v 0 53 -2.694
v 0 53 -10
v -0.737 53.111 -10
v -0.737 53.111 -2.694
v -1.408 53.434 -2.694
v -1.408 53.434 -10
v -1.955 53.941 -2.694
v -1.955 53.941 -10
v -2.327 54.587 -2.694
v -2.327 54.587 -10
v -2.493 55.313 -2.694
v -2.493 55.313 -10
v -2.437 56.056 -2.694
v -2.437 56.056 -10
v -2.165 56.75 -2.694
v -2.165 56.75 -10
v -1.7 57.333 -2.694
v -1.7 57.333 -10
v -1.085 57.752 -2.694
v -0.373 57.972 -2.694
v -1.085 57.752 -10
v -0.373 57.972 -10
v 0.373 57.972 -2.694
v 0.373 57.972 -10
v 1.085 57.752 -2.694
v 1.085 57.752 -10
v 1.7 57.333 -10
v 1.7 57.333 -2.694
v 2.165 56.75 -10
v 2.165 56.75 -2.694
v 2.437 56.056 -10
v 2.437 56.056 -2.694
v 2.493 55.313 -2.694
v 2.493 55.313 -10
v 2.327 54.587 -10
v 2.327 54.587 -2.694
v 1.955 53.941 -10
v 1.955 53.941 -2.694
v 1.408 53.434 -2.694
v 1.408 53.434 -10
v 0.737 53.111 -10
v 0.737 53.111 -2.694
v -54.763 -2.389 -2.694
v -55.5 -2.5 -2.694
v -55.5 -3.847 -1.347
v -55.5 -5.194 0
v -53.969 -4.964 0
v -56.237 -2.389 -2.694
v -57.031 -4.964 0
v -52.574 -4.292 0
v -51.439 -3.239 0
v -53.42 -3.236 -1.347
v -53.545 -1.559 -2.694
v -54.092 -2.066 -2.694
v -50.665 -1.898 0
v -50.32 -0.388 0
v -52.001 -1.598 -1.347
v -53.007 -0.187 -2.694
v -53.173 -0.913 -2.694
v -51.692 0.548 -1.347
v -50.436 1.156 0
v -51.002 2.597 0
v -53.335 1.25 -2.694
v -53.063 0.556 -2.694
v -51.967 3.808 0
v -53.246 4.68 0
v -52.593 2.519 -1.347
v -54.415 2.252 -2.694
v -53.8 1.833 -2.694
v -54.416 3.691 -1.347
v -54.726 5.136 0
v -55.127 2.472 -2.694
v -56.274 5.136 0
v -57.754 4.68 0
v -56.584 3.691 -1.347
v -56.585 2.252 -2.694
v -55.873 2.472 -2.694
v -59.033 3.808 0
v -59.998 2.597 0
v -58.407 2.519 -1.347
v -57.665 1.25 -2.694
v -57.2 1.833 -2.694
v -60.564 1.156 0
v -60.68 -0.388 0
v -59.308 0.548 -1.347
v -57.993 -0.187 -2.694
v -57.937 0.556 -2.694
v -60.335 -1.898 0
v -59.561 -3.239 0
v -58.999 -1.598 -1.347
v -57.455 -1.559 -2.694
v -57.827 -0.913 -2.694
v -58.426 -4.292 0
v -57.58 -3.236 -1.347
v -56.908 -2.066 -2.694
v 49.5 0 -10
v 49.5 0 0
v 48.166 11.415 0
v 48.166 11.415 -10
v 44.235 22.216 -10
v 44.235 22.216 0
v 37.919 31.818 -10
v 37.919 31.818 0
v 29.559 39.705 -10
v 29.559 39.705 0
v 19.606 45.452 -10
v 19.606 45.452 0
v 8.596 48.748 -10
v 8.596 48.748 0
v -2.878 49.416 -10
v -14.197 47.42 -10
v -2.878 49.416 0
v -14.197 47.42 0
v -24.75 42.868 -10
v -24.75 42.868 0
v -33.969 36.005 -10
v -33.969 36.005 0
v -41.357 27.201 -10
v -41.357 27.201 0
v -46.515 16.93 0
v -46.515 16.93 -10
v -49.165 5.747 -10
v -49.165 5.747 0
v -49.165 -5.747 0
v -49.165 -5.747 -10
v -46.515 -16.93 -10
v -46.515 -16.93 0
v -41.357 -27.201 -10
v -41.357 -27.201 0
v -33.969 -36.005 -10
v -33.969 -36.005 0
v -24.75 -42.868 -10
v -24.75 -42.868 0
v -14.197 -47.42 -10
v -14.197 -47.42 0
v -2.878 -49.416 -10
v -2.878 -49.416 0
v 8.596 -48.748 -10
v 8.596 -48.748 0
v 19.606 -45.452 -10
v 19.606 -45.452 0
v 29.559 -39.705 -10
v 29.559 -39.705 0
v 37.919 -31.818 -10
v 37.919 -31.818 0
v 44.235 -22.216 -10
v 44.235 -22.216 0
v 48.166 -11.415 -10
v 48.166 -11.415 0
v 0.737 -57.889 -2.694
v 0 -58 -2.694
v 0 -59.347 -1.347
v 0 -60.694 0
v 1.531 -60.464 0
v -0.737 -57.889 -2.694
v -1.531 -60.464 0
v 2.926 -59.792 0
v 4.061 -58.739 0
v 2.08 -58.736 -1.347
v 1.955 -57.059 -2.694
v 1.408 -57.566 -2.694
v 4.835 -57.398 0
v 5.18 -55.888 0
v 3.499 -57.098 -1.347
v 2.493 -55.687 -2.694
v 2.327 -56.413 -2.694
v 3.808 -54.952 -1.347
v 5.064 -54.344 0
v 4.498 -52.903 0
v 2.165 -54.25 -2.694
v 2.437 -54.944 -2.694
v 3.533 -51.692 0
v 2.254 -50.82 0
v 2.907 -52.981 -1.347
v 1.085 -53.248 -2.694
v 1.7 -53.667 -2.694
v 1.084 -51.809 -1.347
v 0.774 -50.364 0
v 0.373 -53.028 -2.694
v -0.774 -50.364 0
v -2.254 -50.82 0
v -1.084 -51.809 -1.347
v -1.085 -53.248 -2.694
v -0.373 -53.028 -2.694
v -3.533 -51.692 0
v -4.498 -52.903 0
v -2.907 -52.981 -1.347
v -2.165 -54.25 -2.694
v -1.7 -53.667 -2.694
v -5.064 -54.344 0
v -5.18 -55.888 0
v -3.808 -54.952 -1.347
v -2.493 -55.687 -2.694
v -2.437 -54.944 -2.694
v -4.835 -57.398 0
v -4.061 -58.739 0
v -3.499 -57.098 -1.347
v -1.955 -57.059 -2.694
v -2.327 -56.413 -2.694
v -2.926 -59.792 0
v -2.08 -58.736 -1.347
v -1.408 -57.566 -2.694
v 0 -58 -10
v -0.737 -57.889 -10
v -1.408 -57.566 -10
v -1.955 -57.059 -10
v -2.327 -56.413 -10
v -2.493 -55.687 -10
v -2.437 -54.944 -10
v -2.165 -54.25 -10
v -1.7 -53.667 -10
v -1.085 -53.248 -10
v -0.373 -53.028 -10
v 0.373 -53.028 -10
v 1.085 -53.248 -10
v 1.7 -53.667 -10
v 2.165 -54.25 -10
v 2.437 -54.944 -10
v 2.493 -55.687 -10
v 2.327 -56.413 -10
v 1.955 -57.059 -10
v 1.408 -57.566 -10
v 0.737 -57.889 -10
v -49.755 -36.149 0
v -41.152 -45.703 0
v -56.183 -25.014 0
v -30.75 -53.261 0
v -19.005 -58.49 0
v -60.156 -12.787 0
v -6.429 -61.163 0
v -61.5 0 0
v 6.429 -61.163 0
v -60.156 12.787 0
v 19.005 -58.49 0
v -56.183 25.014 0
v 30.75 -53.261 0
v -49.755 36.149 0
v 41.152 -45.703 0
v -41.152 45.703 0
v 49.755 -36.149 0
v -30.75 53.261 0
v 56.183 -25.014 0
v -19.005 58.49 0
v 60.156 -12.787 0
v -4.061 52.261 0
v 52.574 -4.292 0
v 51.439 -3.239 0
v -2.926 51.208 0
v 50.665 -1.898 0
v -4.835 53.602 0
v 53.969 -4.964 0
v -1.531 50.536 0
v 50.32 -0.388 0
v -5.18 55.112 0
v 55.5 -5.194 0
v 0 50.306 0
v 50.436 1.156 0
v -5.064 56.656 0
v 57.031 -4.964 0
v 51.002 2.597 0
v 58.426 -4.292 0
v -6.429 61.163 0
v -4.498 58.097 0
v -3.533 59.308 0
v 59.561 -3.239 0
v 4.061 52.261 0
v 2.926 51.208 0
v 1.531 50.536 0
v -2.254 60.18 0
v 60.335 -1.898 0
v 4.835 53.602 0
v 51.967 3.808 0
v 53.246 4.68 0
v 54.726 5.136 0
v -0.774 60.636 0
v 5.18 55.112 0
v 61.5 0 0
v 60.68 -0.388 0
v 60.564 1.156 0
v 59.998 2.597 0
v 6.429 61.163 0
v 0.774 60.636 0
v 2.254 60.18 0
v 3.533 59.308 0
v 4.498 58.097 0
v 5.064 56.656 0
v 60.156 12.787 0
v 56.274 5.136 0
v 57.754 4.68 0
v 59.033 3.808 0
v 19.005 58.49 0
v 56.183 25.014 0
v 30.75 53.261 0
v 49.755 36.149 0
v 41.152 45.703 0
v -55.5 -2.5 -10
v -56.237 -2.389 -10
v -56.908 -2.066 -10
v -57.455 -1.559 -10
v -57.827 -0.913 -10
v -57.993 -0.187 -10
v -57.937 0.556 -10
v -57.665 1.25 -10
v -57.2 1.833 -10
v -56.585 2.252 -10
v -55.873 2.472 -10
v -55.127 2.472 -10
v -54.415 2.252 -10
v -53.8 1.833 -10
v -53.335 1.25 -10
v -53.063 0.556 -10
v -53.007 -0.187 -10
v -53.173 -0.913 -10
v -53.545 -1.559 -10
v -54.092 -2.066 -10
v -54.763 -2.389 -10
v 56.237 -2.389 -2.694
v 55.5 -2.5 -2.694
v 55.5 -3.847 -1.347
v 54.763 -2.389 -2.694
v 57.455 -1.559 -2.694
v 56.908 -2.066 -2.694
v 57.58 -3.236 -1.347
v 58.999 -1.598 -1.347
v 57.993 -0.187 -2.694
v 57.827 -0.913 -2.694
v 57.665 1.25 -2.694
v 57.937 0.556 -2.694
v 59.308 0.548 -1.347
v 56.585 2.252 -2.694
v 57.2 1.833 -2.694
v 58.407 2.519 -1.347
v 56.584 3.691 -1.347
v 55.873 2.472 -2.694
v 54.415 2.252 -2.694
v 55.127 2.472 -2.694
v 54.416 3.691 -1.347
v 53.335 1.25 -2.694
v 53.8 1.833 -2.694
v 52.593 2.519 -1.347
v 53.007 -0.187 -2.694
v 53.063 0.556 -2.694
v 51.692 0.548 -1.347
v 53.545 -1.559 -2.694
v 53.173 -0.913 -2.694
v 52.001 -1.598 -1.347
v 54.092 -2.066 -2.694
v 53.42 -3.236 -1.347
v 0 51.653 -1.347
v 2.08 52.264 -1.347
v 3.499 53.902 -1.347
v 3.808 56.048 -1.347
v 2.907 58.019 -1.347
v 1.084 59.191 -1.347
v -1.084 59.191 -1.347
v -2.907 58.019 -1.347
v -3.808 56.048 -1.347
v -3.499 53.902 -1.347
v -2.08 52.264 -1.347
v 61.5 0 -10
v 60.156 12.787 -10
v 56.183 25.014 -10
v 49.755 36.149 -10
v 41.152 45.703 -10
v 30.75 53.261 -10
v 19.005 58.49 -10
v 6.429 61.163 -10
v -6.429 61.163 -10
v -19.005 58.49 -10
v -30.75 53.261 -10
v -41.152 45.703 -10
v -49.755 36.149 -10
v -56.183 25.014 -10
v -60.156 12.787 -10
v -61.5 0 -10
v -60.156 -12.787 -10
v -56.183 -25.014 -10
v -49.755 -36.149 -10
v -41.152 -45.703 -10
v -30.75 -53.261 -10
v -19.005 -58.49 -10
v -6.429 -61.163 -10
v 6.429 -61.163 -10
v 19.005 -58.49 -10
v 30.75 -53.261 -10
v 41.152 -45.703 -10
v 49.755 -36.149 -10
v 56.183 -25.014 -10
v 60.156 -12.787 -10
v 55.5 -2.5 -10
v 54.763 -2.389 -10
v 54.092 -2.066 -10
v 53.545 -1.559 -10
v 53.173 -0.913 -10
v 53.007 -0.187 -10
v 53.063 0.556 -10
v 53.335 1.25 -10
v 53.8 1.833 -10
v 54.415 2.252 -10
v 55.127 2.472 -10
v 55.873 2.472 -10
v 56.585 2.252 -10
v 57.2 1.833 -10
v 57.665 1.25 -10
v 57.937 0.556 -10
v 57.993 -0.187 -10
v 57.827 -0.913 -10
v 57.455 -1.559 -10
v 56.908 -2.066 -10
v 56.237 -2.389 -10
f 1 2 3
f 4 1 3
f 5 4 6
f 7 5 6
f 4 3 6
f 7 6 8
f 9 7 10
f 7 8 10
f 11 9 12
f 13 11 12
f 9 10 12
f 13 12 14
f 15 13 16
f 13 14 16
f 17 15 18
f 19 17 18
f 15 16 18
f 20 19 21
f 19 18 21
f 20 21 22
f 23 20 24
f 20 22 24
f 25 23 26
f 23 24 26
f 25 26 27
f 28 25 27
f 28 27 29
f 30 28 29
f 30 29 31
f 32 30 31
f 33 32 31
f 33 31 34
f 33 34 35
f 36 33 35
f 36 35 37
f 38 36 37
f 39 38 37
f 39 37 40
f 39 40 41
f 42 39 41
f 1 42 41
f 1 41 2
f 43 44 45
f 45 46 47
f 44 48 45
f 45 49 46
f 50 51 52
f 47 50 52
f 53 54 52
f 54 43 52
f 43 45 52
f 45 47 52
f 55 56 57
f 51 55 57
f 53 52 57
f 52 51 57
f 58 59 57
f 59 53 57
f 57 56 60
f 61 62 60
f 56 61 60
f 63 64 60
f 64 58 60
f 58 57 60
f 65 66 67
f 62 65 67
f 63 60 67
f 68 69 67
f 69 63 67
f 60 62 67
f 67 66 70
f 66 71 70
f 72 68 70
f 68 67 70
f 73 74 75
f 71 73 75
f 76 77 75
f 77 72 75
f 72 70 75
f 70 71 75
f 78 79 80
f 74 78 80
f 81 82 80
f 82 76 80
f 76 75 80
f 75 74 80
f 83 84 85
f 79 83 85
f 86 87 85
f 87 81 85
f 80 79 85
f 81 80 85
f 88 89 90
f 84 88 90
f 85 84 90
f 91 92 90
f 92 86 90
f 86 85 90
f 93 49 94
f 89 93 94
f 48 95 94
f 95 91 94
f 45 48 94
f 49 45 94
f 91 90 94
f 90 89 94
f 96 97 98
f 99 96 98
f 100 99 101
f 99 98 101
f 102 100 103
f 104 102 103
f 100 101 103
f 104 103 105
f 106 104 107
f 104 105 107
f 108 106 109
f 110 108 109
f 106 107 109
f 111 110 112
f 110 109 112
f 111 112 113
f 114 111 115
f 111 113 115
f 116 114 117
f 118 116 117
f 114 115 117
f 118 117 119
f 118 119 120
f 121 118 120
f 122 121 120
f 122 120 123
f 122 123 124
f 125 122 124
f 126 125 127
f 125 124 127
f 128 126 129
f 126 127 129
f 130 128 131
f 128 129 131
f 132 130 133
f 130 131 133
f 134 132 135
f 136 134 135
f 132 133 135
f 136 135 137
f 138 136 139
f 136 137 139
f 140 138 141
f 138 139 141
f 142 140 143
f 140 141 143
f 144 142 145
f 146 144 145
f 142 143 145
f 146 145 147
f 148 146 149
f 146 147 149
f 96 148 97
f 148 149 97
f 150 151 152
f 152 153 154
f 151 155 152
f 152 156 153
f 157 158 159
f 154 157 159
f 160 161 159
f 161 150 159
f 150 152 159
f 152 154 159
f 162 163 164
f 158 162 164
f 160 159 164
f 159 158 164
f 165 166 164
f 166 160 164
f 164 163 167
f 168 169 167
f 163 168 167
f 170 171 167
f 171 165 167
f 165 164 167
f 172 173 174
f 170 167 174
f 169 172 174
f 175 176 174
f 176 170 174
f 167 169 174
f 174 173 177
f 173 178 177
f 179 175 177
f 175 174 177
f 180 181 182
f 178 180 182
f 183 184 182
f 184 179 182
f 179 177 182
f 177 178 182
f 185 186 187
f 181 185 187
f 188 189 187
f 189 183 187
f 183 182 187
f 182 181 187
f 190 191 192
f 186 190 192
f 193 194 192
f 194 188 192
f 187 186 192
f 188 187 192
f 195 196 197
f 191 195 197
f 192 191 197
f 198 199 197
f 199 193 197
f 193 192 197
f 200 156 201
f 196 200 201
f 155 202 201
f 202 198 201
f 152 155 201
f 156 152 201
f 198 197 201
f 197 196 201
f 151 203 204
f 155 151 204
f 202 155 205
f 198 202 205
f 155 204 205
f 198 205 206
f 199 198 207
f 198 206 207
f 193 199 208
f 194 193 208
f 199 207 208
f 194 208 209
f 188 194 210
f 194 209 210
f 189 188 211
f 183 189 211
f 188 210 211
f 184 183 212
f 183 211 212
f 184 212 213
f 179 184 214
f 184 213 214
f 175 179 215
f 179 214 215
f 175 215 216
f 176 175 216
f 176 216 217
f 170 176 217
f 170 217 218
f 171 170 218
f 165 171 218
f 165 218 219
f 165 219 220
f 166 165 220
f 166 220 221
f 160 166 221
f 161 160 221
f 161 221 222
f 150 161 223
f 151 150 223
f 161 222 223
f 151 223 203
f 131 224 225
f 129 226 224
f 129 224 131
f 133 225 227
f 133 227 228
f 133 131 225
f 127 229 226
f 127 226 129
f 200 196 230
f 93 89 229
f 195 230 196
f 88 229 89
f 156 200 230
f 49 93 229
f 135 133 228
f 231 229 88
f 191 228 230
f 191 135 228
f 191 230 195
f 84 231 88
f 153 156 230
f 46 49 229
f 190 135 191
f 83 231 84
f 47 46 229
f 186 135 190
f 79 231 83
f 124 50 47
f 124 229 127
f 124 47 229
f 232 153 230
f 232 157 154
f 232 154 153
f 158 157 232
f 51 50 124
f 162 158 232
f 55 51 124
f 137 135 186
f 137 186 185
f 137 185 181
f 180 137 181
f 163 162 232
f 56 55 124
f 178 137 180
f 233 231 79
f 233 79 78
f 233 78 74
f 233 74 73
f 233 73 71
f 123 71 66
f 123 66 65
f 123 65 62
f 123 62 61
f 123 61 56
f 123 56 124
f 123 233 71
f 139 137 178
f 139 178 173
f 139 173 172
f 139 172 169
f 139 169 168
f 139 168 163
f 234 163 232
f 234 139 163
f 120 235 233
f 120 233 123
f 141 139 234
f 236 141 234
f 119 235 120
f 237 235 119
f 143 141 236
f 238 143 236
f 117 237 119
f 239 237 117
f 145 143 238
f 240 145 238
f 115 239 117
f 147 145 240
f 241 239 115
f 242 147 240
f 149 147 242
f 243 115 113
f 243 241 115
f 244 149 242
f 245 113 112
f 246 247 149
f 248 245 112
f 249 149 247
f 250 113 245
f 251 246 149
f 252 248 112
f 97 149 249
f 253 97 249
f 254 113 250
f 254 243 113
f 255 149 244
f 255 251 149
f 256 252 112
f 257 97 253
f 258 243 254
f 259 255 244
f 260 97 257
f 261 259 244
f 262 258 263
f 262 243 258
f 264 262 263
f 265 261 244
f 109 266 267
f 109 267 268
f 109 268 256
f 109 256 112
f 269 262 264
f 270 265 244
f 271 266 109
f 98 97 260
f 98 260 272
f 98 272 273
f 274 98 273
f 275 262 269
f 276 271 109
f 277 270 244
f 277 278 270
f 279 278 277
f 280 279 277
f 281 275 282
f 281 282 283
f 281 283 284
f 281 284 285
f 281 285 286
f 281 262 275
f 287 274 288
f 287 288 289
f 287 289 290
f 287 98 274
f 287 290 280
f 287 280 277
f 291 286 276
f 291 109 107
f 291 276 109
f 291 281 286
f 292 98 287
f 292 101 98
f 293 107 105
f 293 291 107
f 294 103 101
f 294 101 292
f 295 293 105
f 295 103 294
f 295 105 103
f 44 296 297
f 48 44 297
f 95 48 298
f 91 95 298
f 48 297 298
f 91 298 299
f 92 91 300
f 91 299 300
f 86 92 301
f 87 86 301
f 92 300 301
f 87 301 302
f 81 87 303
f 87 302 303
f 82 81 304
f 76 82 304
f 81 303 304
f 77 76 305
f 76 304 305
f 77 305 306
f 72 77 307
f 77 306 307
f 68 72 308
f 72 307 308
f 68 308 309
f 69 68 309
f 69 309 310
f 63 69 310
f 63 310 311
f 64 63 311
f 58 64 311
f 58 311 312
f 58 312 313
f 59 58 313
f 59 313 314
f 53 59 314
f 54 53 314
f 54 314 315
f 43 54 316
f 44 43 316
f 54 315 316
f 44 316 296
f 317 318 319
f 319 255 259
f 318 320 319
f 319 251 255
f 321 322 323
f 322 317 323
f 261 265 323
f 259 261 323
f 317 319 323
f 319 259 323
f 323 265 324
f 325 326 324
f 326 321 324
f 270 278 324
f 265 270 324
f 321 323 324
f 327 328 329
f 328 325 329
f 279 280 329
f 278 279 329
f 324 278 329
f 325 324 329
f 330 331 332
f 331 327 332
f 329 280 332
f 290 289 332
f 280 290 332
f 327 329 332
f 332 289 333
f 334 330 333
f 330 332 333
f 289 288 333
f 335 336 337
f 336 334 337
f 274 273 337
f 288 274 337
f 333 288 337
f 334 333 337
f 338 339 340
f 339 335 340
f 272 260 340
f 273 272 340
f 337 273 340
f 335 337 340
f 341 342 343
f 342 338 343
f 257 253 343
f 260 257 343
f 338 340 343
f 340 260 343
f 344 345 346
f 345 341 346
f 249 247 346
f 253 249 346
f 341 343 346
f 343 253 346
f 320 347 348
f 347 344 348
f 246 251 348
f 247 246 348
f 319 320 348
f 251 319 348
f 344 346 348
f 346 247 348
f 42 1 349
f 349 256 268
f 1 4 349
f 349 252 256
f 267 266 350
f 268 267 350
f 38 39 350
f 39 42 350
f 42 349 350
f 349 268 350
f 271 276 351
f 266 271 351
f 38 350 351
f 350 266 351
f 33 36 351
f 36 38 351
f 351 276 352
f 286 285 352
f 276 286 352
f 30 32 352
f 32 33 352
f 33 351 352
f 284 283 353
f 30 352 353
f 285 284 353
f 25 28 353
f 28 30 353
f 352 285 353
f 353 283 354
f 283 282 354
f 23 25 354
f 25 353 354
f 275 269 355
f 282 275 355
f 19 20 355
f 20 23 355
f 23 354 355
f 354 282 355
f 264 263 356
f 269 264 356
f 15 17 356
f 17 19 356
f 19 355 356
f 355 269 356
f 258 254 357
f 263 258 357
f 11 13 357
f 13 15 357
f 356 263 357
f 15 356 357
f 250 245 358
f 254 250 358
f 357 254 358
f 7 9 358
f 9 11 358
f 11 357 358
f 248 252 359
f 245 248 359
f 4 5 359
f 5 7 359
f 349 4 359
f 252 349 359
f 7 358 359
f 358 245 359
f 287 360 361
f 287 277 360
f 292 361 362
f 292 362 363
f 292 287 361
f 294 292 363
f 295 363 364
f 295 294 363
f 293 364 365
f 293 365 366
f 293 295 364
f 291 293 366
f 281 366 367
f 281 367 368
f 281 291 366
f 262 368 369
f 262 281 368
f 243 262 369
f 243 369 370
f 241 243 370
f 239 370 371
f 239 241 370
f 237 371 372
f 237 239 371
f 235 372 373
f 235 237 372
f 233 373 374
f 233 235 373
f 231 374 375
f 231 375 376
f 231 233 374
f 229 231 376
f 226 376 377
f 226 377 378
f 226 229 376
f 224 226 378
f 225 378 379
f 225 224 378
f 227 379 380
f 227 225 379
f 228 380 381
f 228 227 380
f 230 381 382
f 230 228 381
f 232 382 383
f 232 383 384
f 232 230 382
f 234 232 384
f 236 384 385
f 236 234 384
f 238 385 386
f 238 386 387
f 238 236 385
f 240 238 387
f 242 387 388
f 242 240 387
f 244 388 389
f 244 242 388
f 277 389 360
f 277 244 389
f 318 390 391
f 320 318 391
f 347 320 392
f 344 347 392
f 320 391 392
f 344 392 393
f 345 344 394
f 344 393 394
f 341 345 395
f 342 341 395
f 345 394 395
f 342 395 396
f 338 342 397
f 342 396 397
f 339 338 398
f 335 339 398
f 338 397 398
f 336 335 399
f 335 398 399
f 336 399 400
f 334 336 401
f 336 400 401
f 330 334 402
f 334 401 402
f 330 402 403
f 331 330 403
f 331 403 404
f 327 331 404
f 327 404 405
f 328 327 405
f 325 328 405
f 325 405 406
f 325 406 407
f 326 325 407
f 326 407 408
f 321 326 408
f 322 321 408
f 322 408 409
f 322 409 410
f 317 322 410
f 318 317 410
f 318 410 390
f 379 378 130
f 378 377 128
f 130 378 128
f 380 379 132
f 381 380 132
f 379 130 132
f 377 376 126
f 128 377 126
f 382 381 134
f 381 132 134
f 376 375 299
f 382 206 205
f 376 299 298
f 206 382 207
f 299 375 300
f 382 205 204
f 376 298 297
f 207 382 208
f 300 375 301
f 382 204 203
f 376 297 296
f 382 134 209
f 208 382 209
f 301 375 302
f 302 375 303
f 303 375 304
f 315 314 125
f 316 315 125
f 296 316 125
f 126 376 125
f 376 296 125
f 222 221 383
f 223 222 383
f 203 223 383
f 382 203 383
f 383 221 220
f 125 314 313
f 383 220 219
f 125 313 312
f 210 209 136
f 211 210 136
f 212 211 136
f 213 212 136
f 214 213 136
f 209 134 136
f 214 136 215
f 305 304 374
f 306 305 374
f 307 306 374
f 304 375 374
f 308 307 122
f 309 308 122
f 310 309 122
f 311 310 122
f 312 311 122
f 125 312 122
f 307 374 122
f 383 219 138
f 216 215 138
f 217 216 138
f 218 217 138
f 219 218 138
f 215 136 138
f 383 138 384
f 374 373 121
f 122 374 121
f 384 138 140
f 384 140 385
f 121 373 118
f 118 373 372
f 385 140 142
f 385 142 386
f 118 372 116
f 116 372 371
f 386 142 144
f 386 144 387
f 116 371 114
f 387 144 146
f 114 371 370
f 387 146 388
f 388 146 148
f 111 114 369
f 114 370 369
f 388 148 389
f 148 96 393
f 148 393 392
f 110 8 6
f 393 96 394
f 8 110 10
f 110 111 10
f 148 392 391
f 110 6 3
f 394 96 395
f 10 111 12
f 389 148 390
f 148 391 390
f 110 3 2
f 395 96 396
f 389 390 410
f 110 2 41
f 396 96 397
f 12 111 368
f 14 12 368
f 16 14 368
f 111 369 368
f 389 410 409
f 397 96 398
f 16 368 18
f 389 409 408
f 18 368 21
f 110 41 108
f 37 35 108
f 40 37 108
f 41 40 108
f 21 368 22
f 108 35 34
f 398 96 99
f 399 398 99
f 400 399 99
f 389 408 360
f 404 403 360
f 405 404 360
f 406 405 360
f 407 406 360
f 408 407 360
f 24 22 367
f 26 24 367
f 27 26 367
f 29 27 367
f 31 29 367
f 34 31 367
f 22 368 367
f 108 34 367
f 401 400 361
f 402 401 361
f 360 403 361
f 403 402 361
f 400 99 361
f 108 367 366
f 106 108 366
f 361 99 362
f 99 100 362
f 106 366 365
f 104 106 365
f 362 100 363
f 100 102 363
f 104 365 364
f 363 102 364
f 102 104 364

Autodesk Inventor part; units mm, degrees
ref_plane "YZ Plane" through (0, 0, 0) normal (1, 0, 0) x (0, 1, 0)
ref_plane "XZ Plane" through (0, 0, 0) normal (0, 1, 0) x (-1, 0, 0)
ref_plane "Work Plane1" through (0, 0, 0) normal (0, 0, 1) x (1, 0, 0)
sketch "Sketch1" plane through (0, 0, 0) normal (0, 0, 1) x (1, 0, 0)
  circle A0 centre (0, 0) radius 62.3 projected
  circle A1 centre (0, 0) radius 49.5
  circle A2 centre (0, 0) radius 61.5
  line L0 (49.5, 0) -> (61.5, 0) construction
  point P0 (55.5, 0)
  point P1 (0, 55.5)
  point P2 (-55.5, 0)
  point P3 (0, -55.5)
  dimension "d0" = 99
  dimension "d1" = 12
  dimension "d4" = 360
ref_plane "Work Plane2" through (-74.3, -74.3, -10) normal (0, 0, -1) x (0, 1, 0)
extrude "Extrusion1" add sketch "Sketch1" against normal up to surface (10 mm away) contours A2
sketch "Sketch2" plane through (0, 0, 0) normal (0, 0, 1) x (1, 0, 0)
  circle A0 centre (0, 0) radius 49.5 projected
  line L0 (49.5, 0) -> (61.5, 0) construction
  circle A1 centre (0, 0) radius 61.5 projected
  point P0 (55.5, 0)
  point P1 (0, 55.5)
  point P2 (-55.5, 0)
  point P3 (0, -55.5)
  dimension "d10" = 360
hole "Hole1" at (55.5, 0, 0) at (0, 55.5, 0) at (-55.5, 0, 0) at (0, -55.5, 0) direction (0, 0, -1) diameter 5 end through all countersink diameter 10.3886 countersink angle 90 clearance for "Flat Head Machine Screw" size "M5" standard "Ansi Metric M Profile"
properties part number "IR"
